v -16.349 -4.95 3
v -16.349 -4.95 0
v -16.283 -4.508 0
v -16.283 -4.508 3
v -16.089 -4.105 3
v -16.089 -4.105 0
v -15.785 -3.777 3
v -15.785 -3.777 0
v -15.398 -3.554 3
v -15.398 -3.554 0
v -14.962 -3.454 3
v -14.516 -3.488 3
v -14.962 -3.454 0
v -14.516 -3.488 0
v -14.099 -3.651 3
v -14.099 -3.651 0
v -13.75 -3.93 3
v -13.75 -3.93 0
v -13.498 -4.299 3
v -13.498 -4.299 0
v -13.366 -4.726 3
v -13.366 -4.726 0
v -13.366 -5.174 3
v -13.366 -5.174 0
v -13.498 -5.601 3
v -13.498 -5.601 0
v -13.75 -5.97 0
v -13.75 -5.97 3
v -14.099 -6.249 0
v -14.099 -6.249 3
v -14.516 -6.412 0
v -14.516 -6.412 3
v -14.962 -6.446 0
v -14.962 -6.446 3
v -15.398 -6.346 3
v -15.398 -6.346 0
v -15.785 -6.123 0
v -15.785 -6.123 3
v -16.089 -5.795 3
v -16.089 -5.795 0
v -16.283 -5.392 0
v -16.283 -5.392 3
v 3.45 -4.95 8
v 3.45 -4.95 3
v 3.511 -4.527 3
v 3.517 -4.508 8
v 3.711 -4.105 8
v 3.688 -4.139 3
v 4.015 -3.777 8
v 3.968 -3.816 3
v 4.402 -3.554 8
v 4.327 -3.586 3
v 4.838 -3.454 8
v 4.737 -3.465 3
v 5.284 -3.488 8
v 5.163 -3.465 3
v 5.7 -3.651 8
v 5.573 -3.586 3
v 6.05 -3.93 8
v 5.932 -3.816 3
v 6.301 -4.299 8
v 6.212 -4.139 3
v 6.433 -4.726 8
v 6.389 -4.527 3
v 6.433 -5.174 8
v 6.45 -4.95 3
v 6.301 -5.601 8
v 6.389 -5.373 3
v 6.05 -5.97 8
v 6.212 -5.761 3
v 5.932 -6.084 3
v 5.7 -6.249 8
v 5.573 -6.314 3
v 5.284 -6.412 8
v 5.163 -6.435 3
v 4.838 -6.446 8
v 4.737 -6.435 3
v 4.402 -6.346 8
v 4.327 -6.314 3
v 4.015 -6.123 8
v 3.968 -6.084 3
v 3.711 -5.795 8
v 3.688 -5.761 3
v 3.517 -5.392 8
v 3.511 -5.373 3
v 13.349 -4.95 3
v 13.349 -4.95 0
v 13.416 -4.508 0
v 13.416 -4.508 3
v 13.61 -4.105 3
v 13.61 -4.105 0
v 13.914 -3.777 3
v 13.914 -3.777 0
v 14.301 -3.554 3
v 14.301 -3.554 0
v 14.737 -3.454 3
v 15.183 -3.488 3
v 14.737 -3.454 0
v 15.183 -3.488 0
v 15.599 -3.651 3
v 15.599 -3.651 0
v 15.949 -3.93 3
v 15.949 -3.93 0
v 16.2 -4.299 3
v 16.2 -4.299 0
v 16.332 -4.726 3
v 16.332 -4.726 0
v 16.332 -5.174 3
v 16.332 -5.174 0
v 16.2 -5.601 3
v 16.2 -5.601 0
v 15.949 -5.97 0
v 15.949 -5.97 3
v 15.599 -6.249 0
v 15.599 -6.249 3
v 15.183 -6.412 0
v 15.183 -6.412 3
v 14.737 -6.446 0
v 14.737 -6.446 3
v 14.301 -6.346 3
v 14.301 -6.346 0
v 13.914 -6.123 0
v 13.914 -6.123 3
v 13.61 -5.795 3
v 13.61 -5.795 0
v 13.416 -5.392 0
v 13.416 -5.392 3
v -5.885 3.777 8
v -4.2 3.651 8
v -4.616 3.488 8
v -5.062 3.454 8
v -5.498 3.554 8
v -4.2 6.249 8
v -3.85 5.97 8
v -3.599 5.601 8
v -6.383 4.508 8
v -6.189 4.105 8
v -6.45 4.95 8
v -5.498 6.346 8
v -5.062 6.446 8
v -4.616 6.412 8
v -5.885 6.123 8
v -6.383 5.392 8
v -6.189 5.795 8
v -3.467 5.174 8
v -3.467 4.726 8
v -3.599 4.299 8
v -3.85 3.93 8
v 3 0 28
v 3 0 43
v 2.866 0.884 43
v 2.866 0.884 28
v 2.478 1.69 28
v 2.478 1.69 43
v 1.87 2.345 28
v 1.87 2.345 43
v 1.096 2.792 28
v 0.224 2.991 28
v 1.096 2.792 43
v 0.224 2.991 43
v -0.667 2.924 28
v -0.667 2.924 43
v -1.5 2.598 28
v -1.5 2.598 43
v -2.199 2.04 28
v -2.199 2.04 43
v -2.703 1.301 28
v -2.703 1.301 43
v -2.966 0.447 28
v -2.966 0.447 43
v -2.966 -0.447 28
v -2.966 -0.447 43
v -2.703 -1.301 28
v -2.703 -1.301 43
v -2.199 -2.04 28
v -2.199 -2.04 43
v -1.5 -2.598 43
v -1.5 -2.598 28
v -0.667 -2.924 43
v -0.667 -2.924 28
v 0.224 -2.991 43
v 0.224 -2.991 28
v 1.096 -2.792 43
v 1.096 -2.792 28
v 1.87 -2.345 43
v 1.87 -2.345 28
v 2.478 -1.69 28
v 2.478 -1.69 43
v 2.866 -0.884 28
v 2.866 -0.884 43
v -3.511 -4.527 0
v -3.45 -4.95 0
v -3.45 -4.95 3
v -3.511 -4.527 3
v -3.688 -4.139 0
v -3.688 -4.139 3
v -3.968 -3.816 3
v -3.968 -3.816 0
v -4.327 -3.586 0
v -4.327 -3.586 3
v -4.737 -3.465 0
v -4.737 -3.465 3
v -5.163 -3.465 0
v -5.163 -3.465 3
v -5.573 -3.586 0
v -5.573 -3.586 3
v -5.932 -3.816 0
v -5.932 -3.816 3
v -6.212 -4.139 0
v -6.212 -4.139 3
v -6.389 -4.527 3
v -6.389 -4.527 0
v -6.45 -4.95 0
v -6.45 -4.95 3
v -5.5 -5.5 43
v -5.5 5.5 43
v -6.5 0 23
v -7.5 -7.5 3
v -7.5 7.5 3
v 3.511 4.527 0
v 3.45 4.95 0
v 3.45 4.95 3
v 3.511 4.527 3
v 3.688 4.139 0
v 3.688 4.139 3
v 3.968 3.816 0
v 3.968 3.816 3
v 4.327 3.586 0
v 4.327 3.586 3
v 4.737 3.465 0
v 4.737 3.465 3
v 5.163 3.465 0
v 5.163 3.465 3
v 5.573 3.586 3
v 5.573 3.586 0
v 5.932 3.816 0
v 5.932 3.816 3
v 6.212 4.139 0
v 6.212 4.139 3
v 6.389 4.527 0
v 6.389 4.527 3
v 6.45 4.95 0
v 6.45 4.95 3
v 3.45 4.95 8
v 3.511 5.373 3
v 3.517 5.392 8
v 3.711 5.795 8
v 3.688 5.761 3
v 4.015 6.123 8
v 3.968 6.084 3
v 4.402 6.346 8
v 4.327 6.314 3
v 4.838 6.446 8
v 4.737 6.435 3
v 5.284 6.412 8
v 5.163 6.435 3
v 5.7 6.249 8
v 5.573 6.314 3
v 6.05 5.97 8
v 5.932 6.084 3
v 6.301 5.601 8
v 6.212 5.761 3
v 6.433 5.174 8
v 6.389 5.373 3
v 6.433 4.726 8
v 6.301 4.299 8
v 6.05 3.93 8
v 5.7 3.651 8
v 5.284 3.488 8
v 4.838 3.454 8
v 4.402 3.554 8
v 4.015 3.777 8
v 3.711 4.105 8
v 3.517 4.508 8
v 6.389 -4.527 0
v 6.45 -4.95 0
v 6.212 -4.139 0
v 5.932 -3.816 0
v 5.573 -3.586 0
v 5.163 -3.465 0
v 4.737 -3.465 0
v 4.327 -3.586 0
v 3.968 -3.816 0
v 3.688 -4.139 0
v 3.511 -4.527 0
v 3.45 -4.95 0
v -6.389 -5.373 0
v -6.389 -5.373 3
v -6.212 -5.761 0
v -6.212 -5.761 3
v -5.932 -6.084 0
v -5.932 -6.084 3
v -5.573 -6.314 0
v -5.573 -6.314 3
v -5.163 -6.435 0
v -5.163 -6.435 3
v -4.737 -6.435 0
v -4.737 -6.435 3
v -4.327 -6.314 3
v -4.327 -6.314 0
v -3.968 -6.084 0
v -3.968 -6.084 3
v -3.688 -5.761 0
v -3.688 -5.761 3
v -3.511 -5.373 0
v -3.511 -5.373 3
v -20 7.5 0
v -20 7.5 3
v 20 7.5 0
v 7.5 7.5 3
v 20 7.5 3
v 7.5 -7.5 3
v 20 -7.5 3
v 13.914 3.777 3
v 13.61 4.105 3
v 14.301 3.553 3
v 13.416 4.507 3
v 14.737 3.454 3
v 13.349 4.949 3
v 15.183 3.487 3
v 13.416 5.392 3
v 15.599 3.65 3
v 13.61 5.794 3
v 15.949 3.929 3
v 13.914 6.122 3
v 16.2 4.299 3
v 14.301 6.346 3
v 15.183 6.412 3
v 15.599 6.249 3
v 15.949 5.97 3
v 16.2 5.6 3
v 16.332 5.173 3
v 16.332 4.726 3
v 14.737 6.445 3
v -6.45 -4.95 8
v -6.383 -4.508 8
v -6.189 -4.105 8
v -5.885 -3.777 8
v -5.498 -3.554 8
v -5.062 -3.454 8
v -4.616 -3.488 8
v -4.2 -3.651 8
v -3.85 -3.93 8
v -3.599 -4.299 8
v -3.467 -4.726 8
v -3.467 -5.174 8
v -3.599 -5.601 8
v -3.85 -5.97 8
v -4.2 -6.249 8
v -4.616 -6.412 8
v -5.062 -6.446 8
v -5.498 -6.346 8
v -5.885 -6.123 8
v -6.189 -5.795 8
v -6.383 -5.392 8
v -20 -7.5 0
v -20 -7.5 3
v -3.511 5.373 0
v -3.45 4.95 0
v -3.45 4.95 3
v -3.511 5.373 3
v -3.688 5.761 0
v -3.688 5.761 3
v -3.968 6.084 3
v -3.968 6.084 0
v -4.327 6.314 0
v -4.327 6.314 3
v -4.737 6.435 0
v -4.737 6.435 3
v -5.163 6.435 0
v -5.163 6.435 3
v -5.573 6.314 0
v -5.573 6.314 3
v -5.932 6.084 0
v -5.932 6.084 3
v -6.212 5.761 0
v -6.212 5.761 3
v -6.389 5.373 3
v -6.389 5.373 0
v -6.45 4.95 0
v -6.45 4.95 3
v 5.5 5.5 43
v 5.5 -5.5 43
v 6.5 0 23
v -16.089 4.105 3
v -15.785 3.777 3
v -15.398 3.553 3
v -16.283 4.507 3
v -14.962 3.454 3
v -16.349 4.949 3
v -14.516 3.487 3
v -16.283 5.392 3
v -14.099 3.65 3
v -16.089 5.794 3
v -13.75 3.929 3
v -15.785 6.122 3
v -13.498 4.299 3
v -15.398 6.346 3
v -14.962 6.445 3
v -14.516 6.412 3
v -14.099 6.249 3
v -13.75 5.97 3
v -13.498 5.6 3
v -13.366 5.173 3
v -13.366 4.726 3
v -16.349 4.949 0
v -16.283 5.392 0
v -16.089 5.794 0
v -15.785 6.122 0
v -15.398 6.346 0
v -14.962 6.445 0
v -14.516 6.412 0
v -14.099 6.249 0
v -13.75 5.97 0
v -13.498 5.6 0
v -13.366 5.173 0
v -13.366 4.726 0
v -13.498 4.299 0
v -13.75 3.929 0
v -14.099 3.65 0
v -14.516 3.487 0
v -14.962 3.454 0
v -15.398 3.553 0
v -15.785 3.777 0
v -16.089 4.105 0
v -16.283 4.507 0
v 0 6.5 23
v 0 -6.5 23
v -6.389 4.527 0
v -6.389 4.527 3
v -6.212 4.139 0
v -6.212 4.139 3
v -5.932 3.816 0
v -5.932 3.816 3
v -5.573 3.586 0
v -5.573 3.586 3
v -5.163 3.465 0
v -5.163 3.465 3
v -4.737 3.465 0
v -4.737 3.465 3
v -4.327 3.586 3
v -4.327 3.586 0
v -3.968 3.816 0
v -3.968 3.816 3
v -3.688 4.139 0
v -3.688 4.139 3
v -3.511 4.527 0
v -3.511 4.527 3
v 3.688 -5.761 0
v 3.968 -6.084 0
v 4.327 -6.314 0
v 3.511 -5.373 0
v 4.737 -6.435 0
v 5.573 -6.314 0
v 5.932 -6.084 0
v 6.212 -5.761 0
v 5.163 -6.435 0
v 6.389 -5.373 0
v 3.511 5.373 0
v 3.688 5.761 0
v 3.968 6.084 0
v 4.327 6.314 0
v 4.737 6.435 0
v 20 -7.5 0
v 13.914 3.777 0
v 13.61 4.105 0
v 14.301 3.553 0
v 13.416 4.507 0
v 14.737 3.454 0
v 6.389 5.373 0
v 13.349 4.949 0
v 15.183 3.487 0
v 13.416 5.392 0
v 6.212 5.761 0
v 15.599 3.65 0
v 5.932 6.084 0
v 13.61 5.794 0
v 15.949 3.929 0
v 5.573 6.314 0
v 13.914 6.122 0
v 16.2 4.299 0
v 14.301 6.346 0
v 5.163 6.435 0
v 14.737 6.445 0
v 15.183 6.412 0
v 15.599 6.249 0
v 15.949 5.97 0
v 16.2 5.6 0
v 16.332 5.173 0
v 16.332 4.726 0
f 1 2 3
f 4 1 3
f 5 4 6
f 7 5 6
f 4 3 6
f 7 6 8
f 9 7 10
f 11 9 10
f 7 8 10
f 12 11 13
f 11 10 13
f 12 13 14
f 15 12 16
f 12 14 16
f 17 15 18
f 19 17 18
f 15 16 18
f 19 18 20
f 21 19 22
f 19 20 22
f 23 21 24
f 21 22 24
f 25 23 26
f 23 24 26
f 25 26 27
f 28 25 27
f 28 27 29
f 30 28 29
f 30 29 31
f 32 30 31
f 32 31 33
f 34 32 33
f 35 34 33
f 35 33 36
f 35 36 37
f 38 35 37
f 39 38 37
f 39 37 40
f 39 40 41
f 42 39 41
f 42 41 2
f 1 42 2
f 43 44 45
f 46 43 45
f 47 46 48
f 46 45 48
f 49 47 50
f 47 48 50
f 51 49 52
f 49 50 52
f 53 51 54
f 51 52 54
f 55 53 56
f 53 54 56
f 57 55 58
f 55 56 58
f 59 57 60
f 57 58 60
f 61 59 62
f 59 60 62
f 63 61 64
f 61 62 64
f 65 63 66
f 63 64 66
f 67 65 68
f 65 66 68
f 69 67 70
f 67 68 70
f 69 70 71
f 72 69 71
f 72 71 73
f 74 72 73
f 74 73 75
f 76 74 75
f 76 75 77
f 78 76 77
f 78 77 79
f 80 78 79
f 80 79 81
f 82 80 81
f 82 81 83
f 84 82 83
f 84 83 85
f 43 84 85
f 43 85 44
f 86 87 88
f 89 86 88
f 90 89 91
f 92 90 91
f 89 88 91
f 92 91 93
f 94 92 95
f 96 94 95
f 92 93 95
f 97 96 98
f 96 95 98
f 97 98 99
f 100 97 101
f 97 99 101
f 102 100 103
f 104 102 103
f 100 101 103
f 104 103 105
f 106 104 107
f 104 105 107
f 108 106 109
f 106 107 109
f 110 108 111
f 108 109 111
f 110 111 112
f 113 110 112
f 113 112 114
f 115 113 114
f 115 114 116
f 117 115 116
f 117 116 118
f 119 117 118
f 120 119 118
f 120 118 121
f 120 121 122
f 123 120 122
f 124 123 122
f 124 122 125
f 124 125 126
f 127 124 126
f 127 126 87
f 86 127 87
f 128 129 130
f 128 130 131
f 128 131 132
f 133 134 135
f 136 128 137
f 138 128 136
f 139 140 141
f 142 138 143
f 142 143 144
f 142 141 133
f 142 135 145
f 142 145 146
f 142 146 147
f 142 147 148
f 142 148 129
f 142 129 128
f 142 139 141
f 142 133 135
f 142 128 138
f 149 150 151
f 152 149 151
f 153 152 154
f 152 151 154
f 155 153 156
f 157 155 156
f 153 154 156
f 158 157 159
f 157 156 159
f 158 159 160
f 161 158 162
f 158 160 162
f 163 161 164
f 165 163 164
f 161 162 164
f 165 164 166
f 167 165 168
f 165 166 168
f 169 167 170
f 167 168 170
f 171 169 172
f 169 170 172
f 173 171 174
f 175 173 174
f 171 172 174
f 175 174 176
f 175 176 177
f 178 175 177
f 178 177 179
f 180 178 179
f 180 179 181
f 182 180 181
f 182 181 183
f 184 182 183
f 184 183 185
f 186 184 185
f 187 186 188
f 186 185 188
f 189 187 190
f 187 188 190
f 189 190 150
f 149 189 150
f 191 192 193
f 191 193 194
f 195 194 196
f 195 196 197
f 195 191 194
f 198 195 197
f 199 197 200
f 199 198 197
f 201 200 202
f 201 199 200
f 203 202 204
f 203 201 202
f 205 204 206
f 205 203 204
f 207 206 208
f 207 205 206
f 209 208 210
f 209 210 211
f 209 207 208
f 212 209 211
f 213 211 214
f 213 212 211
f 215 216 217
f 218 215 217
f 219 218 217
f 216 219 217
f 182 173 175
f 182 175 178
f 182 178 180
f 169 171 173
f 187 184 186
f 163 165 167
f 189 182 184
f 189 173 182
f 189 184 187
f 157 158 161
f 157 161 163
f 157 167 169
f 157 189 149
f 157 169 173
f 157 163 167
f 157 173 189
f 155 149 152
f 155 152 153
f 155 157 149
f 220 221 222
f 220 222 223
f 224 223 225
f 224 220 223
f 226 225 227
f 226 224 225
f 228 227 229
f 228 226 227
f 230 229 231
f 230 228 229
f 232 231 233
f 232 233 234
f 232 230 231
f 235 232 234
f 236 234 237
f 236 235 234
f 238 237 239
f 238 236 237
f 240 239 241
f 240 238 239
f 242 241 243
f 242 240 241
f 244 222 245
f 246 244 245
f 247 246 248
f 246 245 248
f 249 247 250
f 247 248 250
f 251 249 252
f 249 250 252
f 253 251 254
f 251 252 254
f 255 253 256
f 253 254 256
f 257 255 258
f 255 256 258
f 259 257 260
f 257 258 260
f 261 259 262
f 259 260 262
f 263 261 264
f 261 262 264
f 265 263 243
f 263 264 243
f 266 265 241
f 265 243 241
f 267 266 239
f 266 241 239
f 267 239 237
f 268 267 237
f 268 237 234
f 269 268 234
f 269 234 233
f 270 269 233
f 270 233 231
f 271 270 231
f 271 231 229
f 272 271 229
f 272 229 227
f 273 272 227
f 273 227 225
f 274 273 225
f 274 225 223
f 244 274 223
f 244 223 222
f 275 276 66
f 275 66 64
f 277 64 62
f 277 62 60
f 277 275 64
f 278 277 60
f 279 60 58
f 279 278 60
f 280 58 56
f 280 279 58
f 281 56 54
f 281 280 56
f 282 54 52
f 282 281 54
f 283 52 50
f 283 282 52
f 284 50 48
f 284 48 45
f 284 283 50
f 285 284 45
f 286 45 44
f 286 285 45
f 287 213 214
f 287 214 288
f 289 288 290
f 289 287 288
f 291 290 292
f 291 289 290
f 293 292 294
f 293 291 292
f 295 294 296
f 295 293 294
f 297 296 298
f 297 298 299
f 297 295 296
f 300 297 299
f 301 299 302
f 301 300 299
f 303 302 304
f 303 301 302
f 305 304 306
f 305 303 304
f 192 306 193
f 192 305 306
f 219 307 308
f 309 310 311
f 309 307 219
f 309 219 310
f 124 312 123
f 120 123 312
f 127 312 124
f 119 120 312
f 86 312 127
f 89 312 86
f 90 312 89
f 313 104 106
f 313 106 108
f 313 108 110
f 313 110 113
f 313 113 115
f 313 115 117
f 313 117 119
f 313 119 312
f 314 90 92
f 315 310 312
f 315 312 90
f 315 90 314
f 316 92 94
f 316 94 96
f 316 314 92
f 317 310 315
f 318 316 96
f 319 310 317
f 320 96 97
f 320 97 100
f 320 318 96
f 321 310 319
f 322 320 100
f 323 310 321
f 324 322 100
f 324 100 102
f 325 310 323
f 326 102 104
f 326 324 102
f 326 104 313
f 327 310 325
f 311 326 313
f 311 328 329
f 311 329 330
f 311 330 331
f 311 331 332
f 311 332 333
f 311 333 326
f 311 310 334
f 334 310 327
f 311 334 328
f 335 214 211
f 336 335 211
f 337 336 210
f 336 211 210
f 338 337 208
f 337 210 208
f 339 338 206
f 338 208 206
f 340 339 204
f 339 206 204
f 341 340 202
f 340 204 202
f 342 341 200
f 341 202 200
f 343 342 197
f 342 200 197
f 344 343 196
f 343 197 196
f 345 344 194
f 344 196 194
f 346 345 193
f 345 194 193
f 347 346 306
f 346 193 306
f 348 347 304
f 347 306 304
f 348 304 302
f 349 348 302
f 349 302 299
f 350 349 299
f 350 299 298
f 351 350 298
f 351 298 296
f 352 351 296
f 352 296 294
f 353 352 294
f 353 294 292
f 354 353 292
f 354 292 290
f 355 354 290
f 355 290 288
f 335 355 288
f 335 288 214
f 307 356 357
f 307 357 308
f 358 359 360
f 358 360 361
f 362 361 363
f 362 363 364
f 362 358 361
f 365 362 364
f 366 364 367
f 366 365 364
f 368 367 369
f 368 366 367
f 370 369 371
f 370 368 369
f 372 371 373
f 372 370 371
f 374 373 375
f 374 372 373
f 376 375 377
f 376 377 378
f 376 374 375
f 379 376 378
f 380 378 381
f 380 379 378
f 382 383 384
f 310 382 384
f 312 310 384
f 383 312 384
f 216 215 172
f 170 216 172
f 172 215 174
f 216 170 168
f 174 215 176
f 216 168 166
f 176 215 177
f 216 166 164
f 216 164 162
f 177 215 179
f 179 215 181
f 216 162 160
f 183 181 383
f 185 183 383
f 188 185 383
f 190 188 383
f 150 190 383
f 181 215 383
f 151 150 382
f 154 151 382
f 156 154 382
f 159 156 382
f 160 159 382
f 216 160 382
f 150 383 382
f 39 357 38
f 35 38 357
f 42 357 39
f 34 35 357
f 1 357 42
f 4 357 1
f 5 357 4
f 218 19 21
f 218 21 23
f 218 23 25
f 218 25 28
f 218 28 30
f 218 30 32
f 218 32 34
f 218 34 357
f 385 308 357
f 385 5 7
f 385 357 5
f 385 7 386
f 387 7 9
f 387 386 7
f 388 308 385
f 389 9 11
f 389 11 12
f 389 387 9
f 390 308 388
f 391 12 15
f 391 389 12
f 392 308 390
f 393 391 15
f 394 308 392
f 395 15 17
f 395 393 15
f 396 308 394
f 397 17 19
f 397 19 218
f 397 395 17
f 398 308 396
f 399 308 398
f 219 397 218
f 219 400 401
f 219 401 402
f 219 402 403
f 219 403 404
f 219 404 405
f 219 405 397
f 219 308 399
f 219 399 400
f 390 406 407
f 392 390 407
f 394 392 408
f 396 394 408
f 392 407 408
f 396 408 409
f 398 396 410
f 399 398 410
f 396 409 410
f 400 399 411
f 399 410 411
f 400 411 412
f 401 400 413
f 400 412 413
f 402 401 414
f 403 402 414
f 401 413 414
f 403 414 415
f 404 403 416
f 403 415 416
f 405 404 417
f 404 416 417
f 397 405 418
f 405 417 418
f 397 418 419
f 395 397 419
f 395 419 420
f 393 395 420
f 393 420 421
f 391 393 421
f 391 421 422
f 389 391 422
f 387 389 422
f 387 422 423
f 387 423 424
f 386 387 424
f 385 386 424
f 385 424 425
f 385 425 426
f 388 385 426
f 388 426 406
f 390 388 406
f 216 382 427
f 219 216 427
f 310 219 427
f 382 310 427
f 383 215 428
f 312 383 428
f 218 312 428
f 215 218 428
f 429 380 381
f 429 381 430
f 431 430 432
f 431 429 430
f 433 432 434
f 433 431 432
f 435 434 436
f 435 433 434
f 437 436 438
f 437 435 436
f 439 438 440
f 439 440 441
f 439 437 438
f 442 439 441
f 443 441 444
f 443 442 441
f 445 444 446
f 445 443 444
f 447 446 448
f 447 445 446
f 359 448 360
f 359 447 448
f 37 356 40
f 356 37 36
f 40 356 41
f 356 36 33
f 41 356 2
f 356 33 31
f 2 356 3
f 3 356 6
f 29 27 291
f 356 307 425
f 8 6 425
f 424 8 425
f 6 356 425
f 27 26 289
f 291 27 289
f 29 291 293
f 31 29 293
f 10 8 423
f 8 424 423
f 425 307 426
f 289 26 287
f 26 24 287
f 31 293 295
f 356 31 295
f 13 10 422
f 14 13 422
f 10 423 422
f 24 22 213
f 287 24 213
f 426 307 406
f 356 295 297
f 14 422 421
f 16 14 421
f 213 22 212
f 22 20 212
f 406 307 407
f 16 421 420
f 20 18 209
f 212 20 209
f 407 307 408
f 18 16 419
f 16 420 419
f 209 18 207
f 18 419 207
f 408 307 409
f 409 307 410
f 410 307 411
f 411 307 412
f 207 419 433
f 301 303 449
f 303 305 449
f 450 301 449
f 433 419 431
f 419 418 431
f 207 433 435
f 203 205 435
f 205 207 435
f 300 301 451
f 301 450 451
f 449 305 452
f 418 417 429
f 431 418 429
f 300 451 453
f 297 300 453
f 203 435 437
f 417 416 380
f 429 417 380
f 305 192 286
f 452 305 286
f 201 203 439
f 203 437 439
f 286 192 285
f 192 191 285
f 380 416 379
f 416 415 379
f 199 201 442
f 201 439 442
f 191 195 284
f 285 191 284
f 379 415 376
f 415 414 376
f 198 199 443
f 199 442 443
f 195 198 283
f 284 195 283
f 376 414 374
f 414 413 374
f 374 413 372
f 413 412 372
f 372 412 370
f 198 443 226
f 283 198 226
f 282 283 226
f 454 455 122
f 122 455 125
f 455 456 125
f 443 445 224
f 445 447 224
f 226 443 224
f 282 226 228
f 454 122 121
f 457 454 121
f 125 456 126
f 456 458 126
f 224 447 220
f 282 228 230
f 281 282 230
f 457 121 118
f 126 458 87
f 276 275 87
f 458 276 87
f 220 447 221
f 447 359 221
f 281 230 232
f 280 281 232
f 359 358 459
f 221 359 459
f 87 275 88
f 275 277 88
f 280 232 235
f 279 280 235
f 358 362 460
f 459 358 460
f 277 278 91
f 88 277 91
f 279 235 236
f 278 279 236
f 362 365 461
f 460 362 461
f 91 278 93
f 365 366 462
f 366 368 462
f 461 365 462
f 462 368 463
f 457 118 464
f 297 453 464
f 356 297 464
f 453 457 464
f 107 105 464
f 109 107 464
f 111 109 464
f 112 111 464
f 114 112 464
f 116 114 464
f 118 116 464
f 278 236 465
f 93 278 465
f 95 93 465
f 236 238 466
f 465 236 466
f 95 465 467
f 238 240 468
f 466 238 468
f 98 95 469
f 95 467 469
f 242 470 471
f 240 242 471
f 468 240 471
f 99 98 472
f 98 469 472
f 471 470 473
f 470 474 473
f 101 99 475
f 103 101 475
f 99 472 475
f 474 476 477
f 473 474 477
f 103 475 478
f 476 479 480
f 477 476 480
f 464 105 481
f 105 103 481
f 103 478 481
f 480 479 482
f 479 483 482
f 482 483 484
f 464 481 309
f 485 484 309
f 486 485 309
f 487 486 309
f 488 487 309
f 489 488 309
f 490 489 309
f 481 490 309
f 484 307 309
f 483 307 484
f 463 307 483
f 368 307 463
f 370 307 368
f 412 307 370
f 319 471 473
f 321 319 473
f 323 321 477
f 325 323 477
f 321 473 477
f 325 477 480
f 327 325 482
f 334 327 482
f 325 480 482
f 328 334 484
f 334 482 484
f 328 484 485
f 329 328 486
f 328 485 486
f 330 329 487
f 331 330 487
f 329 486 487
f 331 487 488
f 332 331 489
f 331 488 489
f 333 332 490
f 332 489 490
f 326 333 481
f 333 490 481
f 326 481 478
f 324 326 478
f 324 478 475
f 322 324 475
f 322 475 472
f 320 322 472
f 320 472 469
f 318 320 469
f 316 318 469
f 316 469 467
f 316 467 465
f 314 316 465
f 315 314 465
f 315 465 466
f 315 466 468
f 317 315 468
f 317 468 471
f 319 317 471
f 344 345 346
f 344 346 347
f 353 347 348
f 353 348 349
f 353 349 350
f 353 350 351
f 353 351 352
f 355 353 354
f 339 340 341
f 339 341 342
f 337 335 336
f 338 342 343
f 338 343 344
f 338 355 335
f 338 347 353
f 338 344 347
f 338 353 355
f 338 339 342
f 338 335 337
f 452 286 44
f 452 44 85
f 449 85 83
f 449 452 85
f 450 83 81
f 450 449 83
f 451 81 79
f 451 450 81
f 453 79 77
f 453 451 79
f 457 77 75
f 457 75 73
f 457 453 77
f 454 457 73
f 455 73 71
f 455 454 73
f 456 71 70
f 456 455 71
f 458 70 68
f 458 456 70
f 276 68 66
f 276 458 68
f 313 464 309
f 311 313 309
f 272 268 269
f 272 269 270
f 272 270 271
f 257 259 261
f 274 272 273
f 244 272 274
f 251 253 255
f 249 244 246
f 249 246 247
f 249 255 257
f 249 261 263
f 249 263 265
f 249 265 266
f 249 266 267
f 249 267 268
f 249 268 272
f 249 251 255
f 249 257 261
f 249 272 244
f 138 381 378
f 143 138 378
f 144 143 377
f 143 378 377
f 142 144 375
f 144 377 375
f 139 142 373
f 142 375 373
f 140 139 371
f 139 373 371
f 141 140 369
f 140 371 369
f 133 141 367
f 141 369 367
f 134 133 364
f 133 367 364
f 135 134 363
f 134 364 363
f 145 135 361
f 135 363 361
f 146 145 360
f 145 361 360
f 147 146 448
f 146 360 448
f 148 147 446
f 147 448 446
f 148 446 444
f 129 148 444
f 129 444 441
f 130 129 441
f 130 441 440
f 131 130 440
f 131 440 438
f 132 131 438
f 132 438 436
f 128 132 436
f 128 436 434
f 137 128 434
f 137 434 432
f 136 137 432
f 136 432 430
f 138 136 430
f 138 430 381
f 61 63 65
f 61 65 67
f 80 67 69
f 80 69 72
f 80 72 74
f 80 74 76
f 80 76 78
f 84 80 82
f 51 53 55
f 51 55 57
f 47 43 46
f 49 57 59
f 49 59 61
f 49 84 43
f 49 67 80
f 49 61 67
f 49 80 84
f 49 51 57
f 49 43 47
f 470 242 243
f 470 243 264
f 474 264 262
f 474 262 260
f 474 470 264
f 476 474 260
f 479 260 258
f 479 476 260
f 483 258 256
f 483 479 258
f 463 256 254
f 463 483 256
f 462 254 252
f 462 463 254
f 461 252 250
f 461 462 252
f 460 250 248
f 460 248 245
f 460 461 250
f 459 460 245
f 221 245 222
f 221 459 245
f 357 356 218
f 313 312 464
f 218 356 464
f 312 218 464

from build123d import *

# Parameters (mm, degrees)
SKETCH_1_W          = 40
SKETCH_1_H          = 15
SKETCH_1_R          = 1.5
EXTRUDE_1_DEPTH     = 3
SKETCH_5_R          = 1.5
CUT_EXTRUDE_3_DEPTH = 8
SKETCH_8_R          = 2.999642866
CUT_EXTRUDE_4_DEPTH = 15
SKETCH_9_R          = 1.5
CUT_EXTRUDE_5_DEPTH = 15


with BuildPart() as part:
    # 草图1 → 凸台-拉伸1 (new body)
    with BuildSketch(Plane.XY):
        Rectangle(SKETCH_1_W, SKETCH_1_H)
        with Locations((4.95, 4.95)):
            Circle(SKETCH_1_R, mode=Mode.SUBTRACT)
        with Locations((4.95, -4.95)):
            Circle(SKETCH_1_R, mode=Mode.SUBTRACT)
        with Locations((-4.95, -4.95)):
            Circle(SKETCH_1_R, mode=Mode.SUBTRACT)
        with Locations((-4.95, 4.95)):
            Circle(SKETCH_1_R, mode=Mode.SUBTRACT)
    extrude(amount=EXTRUDE_1_DEPTH)

    # 草图3 → 放样1 section 0
    with BuildSketch(Plane.XY.offset(43)):
        with BuildLine():
            Line((-5.5, -5.5), (5.5, -5.5))
            Line((5.5, -5.5), (5.5, 5.5))
            Line((5.5, 5.5), (-5.5, 5.5))
            Line((-5.5, 5.5), (-5.5, -5.5))
        make_face()
    # 草图2 → 放样1 section 1
    with BuildSketch(Plane.XY.offset(3)):
        with BuildLine():
            Line((-7.5, -7.5), (7.5, -7.5))
            Line((7.5, -7.5), (7.5, 7.5))
            Line((7.5, 7.5), (-7.5, 7.5))
            Line((-7.5, 7.5), (-7.5, -7.5))
        make_face()
    loft()

    # 草图5 → 切除-拉伸3 (cut)
    with BuildSketch(Plane(origin=(0, 0, 0), x_dir=(-1, 0, 0), z_dir=(0, 0, -1))):
        with Locations((4.95, -4.95)):
            Circle(SKETCH_5_R)
        with Locations((4.95, 4.95)):
            Circle(SKETCH_5_R)
        with Locations((-4.95, 4.95)):
            Circle(SKETCH_5_R)
        with Locations((-4.95, -4.95)):
            Circle(SKETCH_5_R)
    extrude(amount=-CUT_EXTRUDE_3_DEPTH, mode=Mode.SUBTRACT)

    # 草图8 → 切除-拉伸4 (cut)
    with BuildSketch(Plane.XY.offset(43)):
        Circle(SKETCH_8_R)
    extrude(amount=-CUT_EXTRUDE_4_DEPTH, mode=Mode.SUBTRACT)

    # 草图9 → 切除-拉伸5 (cut)
    with BuildSketch(Plane(origin=(0, 0, 0), x_dir=(-1, 0, 0), z_dir=(0, 0, -1))):
        with Locations((-14.848989873, -4.95)):
            Circle(SKETCH_9_R)
        with Locations((-14.848989873, 4.949494937)):
            Circle(SKETCH_9_R)
        with Locations((14.849494937, 4.949494937)):
            Circle(SKETCH_9_R)
        with Locations((14.849494937, -4.95)):
            Circle(SKETCH_9_R)
    extrude(amount=-CUT_EXTRUDE_5_DEPTH, mode=Mode.SUBTRACT)


solid = part.part
